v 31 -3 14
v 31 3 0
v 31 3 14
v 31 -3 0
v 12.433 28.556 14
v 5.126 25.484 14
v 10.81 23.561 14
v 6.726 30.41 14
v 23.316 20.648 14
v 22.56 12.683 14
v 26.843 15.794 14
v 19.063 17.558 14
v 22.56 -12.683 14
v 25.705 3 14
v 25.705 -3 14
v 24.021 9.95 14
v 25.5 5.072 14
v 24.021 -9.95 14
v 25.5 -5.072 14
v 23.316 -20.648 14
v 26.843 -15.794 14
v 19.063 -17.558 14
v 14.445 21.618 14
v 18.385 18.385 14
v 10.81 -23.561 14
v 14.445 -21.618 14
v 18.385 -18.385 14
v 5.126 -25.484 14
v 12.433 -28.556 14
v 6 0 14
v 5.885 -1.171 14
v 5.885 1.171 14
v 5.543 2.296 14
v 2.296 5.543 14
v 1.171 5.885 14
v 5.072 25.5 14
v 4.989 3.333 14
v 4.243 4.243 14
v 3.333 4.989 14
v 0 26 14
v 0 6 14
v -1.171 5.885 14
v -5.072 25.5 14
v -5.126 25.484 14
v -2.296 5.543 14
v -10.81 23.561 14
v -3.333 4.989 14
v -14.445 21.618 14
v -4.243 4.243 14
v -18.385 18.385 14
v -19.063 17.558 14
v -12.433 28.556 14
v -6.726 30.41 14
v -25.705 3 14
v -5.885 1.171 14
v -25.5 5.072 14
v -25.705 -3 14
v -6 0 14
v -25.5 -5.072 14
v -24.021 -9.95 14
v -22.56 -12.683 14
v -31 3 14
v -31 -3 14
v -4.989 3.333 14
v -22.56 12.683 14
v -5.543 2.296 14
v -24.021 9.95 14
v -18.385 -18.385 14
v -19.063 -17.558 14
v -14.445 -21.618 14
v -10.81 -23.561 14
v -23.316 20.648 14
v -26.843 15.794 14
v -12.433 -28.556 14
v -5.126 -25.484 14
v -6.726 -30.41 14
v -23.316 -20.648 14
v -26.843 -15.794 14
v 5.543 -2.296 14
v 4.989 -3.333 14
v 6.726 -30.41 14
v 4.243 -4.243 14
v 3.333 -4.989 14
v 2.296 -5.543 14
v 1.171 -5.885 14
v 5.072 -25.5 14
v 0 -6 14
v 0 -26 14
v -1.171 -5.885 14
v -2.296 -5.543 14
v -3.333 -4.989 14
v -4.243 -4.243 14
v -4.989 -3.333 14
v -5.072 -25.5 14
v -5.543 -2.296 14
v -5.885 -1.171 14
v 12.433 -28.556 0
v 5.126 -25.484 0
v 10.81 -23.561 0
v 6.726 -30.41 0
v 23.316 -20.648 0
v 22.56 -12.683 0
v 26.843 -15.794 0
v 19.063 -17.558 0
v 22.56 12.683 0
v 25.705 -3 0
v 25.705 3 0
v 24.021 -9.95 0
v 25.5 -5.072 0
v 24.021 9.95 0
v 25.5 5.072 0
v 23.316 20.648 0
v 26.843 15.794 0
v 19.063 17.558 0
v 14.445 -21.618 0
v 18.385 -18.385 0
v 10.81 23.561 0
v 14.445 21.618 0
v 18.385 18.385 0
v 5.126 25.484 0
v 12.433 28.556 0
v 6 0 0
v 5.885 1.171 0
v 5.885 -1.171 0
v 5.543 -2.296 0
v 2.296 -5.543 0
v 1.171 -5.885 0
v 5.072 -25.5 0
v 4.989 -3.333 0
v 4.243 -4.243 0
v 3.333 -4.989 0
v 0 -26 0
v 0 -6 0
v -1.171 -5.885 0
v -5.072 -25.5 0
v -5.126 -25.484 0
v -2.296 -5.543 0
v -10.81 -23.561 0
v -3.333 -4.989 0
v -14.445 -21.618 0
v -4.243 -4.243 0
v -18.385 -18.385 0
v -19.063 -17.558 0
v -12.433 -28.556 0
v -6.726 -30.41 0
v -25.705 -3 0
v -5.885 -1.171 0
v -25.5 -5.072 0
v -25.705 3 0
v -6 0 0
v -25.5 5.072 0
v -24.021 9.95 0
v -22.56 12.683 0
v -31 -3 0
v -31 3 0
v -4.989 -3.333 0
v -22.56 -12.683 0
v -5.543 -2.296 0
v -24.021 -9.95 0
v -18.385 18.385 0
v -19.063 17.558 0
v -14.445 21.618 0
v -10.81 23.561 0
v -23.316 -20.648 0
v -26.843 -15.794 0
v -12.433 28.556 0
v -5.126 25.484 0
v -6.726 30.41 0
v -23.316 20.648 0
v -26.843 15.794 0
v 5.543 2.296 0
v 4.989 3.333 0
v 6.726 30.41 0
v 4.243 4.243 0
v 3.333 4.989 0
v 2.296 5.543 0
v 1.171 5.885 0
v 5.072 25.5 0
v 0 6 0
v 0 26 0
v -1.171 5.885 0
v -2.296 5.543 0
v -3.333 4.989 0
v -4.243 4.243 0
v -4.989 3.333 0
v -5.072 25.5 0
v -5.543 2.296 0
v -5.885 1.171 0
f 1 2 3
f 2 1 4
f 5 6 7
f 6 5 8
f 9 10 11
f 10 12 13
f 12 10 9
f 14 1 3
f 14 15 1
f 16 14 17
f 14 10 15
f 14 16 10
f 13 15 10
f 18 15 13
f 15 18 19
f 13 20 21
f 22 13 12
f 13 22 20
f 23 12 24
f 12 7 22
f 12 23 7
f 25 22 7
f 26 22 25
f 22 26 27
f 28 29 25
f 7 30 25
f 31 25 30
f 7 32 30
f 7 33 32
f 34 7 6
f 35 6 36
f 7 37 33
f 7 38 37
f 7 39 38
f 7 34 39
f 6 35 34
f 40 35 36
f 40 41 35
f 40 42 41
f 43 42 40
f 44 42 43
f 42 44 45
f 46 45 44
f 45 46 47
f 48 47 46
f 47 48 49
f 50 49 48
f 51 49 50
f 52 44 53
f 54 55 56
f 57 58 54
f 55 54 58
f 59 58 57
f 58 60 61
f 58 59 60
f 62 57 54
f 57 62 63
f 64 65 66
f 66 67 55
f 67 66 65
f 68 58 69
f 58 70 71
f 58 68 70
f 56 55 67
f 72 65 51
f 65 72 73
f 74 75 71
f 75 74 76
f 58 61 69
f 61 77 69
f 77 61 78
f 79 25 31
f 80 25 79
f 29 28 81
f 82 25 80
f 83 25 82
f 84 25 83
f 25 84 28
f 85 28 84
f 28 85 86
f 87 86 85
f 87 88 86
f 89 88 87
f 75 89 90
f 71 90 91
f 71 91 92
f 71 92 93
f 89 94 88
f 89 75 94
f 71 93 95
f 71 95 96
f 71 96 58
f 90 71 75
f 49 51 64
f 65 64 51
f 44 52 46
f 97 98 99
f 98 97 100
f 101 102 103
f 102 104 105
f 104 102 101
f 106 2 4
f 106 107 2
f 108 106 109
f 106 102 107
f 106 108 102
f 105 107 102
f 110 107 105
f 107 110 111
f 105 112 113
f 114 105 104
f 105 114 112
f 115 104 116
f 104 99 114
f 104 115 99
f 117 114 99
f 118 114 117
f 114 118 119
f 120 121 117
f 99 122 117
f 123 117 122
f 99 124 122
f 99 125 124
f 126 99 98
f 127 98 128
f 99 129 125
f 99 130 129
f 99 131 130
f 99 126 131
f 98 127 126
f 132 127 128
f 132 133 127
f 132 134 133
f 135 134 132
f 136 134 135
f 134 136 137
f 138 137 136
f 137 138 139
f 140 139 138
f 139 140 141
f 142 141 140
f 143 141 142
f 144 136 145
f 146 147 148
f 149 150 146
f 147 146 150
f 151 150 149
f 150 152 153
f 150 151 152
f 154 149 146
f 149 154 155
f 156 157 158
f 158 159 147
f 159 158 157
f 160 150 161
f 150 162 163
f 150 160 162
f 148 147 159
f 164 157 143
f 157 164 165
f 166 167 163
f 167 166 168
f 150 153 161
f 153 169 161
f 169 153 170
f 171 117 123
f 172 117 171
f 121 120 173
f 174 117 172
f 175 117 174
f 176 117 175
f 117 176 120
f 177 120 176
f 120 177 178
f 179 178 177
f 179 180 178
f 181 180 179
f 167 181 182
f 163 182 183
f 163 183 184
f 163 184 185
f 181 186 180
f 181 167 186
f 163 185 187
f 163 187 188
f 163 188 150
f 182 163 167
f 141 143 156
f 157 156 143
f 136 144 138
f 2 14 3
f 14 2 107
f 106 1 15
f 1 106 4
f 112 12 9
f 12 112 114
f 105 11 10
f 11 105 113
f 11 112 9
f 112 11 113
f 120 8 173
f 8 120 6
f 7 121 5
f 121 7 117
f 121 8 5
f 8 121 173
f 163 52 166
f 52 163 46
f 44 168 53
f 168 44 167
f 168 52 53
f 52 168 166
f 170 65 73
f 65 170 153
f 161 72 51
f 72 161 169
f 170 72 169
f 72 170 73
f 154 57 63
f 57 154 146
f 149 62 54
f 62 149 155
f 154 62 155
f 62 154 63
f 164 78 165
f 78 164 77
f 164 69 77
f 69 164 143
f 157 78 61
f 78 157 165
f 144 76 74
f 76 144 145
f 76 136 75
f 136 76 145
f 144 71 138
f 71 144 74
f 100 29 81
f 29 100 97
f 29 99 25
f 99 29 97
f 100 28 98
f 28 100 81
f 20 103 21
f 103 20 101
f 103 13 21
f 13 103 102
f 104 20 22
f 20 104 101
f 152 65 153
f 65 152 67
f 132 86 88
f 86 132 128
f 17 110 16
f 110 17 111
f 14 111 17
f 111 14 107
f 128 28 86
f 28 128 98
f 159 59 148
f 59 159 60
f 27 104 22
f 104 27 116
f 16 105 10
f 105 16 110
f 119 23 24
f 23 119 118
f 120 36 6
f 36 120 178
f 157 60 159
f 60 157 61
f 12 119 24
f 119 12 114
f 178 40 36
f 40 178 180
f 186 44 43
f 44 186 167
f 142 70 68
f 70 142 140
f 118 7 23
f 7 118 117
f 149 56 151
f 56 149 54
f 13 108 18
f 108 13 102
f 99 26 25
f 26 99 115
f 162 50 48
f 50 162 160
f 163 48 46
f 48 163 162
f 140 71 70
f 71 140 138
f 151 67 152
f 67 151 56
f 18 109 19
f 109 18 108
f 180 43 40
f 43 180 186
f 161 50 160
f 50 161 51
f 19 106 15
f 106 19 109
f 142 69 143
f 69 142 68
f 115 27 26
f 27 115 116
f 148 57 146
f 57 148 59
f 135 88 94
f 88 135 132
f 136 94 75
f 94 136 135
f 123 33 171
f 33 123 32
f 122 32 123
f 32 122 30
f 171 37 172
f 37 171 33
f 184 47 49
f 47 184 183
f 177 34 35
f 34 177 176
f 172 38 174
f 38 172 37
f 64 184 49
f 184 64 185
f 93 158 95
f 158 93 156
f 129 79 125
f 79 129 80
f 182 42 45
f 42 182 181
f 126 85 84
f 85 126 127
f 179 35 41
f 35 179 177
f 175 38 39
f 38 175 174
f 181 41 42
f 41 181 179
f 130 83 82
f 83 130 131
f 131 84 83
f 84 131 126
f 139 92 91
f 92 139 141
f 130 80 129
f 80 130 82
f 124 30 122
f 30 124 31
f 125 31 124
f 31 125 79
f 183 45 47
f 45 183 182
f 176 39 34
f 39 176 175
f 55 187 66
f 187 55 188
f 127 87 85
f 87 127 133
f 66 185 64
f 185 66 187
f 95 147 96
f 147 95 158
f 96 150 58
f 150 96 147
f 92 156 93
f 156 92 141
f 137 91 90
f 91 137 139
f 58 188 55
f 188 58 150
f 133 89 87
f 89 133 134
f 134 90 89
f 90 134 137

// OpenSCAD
$fn = 32;

// ----------------------------------------------------------------------
// Spur blank: bored gear blank
// ----------------------------------------------------------------------

// --- parameters (mm) ---
disc_r = 26;              // blank root radius
disc_t = 14;              // blank thickness
n_teeth = 10;             // stub tooth count
tooth_w = 6;              // tooth width at the root
tooth_h = 5;              // tooth height above the root
bore_r = 6;               // central bore radius

out_r = disc_r + tooth_h;  // tip radius
bbox_x = 62.0;  // measured width over the teeth
bbox_y = 60.82;  // measured depth over the teeth

difference() {
union() {
  cylinder(r = disc_r, h = disc_t);
  for (i = [0 : n_teeth - 1])
    rotate([0, 0, i * 360 / n_teeth])
      translate([disc_r - 1, -tooth_w / 2, 0])
        cube([tooth_h + 1, tooth_w, disc_t]);
}
  translate([0, 0, -1]) cylinder(r = bore_r, h = disc_t + 2);
}
